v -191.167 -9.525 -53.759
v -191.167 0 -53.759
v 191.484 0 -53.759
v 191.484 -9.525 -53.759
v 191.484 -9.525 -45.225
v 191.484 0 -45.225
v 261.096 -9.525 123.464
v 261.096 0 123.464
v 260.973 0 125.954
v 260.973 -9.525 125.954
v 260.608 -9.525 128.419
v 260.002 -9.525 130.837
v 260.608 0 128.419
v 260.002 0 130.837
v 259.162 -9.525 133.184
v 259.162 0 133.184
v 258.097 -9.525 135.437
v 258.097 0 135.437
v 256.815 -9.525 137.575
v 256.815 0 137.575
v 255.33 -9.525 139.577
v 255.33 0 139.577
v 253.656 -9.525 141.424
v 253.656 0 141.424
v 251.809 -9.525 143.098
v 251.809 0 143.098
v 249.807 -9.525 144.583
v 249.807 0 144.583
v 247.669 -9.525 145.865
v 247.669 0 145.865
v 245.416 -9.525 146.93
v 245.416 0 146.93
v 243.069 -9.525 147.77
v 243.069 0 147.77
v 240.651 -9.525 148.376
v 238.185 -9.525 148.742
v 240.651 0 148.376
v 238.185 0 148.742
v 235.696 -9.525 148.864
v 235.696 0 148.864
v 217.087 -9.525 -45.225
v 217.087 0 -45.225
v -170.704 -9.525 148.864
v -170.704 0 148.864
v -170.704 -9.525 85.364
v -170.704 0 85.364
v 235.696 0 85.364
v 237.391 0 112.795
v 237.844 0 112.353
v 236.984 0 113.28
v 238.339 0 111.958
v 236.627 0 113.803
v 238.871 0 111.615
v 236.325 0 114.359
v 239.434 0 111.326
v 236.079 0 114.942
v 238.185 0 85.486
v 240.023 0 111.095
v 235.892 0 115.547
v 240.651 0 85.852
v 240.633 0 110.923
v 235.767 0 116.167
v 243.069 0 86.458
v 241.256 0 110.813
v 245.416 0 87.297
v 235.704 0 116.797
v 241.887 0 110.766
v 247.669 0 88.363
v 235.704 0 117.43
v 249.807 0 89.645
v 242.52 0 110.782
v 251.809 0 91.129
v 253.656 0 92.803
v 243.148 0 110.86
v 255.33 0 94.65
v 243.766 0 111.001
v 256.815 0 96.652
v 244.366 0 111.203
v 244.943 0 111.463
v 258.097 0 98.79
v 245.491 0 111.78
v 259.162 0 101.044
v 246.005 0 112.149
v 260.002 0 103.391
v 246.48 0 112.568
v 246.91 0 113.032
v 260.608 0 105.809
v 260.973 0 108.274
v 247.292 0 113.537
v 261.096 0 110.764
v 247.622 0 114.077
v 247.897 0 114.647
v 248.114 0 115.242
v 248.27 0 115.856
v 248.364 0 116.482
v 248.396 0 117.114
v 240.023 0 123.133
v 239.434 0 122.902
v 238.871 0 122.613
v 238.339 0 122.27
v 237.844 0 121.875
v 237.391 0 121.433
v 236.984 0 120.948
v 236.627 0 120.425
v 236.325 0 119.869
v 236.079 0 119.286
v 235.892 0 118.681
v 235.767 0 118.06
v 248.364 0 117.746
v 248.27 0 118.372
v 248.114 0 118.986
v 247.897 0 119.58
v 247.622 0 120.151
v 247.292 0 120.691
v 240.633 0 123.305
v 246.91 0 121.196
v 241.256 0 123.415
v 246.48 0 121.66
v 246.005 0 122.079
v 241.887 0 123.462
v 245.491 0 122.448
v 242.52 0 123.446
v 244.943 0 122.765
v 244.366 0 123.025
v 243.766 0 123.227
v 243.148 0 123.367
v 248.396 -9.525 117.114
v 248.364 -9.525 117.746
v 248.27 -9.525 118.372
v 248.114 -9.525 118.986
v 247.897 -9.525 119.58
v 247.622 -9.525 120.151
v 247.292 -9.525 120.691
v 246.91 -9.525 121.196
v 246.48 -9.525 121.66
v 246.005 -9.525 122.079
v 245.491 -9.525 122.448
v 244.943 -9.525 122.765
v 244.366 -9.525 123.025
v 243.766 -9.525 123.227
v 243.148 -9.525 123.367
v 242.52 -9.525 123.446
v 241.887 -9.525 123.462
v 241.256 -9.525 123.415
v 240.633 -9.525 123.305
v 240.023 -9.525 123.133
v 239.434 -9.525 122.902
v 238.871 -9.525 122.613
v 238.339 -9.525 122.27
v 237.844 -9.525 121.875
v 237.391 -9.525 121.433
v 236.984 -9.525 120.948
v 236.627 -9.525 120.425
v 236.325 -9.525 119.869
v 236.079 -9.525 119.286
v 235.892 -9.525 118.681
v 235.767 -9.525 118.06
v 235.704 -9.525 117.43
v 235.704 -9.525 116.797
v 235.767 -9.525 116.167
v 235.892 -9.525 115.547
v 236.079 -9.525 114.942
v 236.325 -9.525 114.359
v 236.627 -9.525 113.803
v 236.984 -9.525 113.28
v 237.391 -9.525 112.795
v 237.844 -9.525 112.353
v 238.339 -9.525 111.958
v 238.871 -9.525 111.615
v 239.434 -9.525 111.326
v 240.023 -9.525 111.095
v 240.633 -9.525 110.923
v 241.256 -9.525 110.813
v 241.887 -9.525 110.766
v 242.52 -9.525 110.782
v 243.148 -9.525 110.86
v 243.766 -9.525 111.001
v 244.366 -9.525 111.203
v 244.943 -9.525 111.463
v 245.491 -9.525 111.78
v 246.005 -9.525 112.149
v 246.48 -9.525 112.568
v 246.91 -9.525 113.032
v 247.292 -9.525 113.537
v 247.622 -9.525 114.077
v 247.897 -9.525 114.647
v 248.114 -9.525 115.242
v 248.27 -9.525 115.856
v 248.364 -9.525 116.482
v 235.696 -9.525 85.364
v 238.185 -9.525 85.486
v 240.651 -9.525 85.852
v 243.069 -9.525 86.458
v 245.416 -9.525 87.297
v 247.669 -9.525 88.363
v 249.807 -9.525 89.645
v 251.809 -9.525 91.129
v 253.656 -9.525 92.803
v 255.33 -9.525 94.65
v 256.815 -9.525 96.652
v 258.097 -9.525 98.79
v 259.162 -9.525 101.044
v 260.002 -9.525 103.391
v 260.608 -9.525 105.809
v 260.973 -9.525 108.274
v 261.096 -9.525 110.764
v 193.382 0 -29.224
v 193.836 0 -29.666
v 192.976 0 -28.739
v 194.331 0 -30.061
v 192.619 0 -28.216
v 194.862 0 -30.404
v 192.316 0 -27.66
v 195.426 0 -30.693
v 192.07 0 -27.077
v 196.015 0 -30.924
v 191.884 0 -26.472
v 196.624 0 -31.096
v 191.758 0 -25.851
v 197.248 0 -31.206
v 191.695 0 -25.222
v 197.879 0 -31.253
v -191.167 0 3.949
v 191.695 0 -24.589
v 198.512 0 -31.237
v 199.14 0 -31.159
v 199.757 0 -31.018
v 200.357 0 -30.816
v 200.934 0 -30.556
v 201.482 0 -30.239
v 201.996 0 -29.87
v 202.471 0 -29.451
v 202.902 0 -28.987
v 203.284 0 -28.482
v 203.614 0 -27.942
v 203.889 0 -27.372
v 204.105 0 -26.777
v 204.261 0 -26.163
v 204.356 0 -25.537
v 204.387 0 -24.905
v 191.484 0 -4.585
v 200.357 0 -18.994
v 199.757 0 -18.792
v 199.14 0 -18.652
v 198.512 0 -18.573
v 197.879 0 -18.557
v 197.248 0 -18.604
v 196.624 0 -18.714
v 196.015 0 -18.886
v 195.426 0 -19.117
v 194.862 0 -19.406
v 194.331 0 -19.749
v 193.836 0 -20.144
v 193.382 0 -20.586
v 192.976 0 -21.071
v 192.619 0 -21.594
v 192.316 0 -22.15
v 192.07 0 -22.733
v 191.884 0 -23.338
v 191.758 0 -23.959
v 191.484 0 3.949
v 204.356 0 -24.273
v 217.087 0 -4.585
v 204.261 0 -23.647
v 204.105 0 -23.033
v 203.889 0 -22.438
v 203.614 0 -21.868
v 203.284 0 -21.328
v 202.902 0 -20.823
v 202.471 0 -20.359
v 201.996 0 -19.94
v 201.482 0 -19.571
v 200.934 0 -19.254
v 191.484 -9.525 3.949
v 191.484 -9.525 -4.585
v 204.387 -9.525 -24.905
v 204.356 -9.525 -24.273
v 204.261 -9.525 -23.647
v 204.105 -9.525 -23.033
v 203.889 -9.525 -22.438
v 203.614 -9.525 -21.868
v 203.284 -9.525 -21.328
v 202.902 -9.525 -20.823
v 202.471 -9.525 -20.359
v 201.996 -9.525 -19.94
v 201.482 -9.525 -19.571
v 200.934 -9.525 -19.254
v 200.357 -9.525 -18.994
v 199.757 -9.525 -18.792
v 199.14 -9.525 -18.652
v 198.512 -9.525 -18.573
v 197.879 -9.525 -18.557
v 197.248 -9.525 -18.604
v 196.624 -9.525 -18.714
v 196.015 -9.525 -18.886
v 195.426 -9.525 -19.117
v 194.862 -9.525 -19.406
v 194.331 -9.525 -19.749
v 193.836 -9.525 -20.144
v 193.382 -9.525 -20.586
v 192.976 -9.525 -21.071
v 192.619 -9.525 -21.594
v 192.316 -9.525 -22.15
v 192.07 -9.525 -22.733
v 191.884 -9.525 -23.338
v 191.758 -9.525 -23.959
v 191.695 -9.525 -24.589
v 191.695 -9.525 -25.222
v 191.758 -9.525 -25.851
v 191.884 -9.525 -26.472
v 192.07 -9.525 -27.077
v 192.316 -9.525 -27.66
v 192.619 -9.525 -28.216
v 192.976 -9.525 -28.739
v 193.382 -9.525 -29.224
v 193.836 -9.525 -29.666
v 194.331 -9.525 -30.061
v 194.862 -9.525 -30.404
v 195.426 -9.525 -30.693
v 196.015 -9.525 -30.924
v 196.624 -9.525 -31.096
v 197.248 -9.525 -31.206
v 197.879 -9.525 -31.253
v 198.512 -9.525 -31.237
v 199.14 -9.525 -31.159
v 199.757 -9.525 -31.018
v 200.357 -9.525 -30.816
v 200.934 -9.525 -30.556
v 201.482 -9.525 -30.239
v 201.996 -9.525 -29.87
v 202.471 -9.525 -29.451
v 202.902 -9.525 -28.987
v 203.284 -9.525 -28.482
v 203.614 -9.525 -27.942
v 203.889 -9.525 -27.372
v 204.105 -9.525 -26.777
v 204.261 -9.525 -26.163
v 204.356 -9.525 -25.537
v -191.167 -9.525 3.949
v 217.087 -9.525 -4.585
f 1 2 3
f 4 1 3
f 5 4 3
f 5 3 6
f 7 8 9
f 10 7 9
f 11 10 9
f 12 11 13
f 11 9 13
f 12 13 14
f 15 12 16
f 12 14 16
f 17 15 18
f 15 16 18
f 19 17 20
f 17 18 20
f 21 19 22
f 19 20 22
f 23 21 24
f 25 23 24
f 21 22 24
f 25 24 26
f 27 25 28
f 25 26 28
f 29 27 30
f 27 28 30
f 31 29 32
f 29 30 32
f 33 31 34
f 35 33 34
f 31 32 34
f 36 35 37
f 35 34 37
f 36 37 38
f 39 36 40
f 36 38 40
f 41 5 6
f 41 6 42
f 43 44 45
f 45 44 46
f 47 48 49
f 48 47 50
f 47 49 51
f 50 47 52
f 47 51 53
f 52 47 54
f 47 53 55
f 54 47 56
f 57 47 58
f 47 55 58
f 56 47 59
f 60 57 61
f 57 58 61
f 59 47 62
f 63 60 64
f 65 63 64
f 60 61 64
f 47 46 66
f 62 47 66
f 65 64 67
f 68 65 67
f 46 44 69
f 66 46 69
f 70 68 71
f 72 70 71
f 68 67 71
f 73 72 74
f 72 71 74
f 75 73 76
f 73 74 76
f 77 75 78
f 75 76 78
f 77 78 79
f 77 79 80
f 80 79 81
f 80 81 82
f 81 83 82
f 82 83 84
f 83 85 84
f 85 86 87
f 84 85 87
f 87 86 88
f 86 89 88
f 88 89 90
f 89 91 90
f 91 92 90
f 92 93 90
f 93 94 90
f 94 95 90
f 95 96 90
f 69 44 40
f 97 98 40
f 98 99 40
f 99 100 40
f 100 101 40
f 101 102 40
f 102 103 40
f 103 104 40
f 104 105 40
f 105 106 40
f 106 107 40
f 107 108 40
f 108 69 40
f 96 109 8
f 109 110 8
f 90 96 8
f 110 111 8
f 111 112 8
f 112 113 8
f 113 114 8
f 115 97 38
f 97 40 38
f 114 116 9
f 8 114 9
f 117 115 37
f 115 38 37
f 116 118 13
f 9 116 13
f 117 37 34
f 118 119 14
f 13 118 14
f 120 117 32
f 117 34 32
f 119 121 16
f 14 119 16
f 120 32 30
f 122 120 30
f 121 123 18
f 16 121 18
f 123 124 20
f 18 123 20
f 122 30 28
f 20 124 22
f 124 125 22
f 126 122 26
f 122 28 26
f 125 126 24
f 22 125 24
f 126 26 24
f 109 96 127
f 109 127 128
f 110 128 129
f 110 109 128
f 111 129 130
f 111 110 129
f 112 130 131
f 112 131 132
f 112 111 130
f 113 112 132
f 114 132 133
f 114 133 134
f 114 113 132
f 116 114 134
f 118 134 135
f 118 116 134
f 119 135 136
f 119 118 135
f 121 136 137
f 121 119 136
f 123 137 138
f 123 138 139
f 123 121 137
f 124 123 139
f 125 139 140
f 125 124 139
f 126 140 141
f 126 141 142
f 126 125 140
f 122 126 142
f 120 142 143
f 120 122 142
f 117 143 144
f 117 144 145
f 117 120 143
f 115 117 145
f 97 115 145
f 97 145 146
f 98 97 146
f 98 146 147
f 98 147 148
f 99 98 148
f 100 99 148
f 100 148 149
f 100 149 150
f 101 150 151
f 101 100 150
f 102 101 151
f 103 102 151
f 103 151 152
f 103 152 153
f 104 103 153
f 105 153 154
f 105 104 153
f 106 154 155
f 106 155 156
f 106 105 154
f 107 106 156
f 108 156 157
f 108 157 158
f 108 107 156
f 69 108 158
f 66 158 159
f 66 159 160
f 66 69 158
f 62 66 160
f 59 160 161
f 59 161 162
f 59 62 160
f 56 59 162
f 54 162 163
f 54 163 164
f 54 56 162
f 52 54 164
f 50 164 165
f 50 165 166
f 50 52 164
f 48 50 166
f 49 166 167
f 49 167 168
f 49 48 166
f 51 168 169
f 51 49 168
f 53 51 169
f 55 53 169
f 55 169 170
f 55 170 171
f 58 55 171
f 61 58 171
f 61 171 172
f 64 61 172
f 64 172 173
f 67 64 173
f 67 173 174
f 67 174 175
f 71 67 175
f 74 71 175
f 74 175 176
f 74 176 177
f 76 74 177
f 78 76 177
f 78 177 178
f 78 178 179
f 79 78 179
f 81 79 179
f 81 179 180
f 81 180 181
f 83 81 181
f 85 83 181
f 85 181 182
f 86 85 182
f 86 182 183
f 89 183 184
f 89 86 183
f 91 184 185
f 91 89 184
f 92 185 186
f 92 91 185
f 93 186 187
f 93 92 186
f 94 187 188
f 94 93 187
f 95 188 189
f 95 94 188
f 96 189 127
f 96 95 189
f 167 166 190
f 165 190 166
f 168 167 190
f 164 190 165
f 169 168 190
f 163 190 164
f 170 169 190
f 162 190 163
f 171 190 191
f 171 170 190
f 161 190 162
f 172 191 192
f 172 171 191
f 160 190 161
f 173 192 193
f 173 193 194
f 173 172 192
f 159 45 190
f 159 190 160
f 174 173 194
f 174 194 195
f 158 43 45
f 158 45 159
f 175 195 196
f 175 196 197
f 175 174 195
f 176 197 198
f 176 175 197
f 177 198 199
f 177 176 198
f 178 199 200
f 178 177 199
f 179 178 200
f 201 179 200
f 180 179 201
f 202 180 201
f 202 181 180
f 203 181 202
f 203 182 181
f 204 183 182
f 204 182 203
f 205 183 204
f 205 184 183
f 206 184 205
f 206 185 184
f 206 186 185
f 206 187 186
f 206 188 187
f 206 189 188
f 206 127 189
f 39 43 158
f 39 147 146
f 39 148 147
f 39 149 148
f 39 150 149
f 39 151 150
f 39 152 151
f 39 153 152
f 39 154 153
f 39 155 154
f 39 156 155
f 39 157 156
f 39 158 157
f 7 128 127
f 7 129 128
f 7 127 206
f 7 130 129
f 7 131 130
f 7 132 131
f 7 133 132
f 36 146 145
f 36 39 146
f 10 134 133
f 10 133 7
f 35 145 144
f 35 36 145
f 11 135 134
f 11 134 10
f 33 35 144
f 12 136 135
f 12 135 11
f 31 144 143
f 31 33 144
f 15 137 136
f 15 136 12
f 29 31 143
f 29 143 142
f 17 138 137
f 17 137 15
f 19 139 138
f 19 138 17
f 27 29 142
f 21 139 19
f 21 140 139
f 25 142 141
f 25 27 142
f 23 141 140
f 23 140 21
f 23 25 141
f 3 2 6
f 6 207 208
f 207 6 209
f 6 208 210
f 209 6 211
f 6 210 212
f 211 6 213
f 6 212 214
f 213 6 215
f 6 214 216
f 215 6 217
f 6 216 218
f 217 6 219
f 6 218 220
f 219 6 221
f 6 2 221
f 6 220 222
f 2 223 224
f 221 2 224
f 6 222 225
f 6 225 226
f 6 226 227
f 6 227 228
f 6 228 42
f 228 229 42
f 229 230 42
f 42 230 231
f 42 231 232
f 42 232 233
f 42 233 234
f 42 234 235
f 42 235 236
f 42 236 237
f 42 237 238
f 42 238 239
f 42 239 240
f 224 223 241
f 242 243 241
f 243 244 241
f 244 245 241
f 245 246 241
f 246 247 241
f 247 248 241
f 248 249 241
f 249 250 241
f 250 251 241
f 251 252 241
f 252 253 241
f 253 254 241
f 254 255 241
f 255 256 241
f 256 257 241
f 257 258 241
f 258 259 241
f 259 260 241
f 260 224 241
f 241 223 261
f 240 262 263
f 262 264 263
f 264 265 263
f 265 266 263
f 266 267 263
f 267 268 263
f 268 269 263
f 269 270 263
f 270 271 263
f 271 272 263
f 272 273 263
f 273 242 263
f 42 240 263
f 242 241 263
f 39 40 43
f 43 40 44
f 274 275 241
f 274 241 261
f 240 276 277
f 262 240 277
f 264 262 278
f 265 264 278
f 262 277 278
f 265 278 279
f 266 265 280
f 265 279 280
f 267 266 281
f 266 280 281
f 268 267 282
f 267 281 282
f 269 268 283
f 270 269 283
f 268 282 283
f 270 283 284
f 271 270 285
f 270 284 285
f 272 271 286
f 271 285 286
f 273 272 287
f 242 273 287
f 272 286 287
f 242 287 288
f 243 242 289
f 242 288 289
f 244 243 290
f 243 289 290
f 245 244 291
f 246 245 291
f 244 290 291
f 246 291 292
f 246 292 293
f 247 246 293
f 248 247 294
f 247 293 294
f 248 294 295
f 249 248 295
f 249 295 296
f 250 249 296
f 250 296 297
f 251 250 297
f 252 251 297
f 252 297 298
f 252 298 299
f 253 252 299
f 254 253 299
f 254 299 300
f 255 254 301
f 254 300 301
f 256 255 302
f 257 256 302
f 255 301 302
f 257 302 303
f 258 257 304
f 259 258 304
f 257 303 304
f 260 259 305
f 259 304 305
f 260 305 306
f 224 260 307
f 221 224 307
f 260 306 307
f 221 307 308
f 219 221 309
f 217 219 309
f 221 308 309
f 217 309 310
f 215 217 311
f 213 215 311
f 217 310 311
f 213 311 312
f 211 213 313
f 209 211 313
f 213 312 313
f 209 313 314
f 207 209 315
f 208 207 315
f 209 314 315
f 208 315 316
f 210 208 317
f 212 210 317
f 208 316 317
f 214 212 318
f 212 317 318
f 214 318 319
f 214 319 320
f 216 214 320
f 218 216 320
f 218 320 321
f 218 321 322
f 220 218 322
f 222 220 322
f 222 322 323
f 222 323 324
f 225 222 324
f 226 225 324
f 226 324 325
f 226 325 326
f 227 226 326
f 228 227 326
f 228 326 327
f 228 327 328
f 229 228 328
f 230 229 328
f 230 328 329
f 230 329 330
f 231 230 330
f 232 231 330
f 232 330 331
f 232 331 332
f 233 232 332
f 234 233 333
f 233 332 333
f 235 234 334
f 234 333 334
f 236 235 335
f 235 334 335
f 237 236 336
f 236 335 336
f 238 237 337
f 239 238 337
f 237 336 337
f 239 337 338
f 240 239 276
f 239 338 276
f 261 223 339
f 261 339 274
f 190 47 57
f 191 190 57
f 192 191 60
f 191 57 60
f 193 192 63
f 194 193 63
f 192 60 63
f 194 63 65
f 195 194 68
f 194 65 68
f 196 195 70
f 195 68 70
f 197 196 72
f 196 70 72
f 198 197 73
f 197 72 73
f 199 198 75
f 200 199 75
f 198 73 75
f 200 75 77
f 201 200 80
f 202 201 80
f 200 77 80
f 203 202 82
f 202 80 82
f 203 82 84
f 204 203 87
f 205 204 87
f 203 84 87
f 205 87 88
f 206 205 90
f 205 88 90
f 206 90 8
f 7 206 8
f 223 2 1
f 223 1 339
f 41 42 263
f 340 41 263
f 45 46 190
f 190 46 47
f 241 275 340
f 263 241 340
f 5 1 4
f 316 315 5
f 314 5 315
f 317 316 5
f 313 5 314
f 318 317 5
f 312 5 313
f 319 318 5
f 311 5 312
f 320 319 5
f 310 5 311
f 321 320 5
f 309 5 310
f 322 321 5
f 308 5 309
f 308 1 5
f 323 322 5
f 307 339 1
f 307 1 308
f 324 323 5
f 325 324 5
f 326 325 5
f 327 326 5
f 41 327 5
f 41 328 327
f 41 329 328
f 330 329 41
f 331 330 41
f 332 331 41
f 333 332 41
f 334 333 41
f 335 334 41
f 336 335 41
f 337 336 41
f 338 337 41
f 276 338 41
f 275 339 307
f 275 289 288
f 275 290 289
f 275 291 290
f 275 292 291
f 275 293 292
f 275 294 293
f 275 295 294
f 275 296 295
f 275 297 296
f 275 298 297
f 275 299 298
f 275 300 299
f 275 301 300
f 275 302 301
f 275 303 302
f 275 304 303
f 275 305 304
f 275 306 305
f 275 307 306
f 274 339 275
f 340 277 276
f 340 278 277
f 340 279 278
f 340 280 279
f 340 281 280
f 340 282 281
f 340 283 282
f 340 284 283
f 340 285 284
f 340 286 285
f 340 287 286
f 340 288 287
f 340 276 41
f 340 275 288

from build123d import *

# Parameters (mm, degrees)
F0_W     = 408.2542
F0_H     = 57.7088
F1_DEPTH = 9.525
F2_R     = 6.35
F3_DEPTH = 9.525
F4_W     = 25.6032
F4_H     = 8.5344
F5_DEPTH = 25.4
F6_DEPTH = 25.4
F7_R     = 6.35
F8_DEPTH = 9.525


with BuildPart() as f1:
    # F0 (on Front) → F1 (new body)
    with BuildSketch(Plane.XZ):
        with Locations((12.960193, -24.905058)):
            Rectangle(F0_W, F0_H)
    extrude(amount=F1_DEPTH)

    # F2 (on face) → F3 (cut)
    with BuildSketch(Plane.XZ.offset(9.525)):
        with Locations((198.037293, -24.905058)):
            Circle(F2_R)
    extrude(amount=-F3_DEPTH, mode=Mode.SUBTRACT)

    # F4 (on face) → F5 (cut)
    with BuildSketch(Plane.XZ.offset(9.525)):
        with Locations((204.285693, -0.317858)):
            Rectangle(F4_W, F4_H)
    extrude(amount=-F5_DEPTH, mode=Mode.SUBTRACT)

    # F4 (on face) → F6 (cut)
    with BuildSketch(Plane.XZ.offset(9.525)):
        with Locations((204.285693, -49.492258)):
            Rectangle(F4_W, F4_H)
    extrude(amount=-F6_DEPTH, mode=Mode.SUBTRACT)


with BuildPart() as f8:
    # F7 (on Front) → F8 (new body)
    with BuildSketch(Plane.XZ):
        with BuildLine():
            Line((235.695731, 148.86389), (-170.704269, 148.86389))
            Line((-170.704269, 148.86389), (-170.704269, 85.36389))
            Line((-170.704269, 85.36389), (235.695731, 85.36389))
            ThreePointArc((235.695731, 85.36389), (253.656243, 92.803378), (261.095731, 110.76389))
            Line((261.095731, 110.76389), (261.095731, 123.46389))
            ThreePointArc((261.095731, 123.46389), (253.656243, 141.424403), (235.695731, 148.86389))
        make_face()
        with Locations((242.045731, 117.11389)):
            Circle(F7_R, mode=Mode.SUBTRACT)
    extrude(amount=F8_DEPTH)


solid = Compound([f1.part, f8.part])
